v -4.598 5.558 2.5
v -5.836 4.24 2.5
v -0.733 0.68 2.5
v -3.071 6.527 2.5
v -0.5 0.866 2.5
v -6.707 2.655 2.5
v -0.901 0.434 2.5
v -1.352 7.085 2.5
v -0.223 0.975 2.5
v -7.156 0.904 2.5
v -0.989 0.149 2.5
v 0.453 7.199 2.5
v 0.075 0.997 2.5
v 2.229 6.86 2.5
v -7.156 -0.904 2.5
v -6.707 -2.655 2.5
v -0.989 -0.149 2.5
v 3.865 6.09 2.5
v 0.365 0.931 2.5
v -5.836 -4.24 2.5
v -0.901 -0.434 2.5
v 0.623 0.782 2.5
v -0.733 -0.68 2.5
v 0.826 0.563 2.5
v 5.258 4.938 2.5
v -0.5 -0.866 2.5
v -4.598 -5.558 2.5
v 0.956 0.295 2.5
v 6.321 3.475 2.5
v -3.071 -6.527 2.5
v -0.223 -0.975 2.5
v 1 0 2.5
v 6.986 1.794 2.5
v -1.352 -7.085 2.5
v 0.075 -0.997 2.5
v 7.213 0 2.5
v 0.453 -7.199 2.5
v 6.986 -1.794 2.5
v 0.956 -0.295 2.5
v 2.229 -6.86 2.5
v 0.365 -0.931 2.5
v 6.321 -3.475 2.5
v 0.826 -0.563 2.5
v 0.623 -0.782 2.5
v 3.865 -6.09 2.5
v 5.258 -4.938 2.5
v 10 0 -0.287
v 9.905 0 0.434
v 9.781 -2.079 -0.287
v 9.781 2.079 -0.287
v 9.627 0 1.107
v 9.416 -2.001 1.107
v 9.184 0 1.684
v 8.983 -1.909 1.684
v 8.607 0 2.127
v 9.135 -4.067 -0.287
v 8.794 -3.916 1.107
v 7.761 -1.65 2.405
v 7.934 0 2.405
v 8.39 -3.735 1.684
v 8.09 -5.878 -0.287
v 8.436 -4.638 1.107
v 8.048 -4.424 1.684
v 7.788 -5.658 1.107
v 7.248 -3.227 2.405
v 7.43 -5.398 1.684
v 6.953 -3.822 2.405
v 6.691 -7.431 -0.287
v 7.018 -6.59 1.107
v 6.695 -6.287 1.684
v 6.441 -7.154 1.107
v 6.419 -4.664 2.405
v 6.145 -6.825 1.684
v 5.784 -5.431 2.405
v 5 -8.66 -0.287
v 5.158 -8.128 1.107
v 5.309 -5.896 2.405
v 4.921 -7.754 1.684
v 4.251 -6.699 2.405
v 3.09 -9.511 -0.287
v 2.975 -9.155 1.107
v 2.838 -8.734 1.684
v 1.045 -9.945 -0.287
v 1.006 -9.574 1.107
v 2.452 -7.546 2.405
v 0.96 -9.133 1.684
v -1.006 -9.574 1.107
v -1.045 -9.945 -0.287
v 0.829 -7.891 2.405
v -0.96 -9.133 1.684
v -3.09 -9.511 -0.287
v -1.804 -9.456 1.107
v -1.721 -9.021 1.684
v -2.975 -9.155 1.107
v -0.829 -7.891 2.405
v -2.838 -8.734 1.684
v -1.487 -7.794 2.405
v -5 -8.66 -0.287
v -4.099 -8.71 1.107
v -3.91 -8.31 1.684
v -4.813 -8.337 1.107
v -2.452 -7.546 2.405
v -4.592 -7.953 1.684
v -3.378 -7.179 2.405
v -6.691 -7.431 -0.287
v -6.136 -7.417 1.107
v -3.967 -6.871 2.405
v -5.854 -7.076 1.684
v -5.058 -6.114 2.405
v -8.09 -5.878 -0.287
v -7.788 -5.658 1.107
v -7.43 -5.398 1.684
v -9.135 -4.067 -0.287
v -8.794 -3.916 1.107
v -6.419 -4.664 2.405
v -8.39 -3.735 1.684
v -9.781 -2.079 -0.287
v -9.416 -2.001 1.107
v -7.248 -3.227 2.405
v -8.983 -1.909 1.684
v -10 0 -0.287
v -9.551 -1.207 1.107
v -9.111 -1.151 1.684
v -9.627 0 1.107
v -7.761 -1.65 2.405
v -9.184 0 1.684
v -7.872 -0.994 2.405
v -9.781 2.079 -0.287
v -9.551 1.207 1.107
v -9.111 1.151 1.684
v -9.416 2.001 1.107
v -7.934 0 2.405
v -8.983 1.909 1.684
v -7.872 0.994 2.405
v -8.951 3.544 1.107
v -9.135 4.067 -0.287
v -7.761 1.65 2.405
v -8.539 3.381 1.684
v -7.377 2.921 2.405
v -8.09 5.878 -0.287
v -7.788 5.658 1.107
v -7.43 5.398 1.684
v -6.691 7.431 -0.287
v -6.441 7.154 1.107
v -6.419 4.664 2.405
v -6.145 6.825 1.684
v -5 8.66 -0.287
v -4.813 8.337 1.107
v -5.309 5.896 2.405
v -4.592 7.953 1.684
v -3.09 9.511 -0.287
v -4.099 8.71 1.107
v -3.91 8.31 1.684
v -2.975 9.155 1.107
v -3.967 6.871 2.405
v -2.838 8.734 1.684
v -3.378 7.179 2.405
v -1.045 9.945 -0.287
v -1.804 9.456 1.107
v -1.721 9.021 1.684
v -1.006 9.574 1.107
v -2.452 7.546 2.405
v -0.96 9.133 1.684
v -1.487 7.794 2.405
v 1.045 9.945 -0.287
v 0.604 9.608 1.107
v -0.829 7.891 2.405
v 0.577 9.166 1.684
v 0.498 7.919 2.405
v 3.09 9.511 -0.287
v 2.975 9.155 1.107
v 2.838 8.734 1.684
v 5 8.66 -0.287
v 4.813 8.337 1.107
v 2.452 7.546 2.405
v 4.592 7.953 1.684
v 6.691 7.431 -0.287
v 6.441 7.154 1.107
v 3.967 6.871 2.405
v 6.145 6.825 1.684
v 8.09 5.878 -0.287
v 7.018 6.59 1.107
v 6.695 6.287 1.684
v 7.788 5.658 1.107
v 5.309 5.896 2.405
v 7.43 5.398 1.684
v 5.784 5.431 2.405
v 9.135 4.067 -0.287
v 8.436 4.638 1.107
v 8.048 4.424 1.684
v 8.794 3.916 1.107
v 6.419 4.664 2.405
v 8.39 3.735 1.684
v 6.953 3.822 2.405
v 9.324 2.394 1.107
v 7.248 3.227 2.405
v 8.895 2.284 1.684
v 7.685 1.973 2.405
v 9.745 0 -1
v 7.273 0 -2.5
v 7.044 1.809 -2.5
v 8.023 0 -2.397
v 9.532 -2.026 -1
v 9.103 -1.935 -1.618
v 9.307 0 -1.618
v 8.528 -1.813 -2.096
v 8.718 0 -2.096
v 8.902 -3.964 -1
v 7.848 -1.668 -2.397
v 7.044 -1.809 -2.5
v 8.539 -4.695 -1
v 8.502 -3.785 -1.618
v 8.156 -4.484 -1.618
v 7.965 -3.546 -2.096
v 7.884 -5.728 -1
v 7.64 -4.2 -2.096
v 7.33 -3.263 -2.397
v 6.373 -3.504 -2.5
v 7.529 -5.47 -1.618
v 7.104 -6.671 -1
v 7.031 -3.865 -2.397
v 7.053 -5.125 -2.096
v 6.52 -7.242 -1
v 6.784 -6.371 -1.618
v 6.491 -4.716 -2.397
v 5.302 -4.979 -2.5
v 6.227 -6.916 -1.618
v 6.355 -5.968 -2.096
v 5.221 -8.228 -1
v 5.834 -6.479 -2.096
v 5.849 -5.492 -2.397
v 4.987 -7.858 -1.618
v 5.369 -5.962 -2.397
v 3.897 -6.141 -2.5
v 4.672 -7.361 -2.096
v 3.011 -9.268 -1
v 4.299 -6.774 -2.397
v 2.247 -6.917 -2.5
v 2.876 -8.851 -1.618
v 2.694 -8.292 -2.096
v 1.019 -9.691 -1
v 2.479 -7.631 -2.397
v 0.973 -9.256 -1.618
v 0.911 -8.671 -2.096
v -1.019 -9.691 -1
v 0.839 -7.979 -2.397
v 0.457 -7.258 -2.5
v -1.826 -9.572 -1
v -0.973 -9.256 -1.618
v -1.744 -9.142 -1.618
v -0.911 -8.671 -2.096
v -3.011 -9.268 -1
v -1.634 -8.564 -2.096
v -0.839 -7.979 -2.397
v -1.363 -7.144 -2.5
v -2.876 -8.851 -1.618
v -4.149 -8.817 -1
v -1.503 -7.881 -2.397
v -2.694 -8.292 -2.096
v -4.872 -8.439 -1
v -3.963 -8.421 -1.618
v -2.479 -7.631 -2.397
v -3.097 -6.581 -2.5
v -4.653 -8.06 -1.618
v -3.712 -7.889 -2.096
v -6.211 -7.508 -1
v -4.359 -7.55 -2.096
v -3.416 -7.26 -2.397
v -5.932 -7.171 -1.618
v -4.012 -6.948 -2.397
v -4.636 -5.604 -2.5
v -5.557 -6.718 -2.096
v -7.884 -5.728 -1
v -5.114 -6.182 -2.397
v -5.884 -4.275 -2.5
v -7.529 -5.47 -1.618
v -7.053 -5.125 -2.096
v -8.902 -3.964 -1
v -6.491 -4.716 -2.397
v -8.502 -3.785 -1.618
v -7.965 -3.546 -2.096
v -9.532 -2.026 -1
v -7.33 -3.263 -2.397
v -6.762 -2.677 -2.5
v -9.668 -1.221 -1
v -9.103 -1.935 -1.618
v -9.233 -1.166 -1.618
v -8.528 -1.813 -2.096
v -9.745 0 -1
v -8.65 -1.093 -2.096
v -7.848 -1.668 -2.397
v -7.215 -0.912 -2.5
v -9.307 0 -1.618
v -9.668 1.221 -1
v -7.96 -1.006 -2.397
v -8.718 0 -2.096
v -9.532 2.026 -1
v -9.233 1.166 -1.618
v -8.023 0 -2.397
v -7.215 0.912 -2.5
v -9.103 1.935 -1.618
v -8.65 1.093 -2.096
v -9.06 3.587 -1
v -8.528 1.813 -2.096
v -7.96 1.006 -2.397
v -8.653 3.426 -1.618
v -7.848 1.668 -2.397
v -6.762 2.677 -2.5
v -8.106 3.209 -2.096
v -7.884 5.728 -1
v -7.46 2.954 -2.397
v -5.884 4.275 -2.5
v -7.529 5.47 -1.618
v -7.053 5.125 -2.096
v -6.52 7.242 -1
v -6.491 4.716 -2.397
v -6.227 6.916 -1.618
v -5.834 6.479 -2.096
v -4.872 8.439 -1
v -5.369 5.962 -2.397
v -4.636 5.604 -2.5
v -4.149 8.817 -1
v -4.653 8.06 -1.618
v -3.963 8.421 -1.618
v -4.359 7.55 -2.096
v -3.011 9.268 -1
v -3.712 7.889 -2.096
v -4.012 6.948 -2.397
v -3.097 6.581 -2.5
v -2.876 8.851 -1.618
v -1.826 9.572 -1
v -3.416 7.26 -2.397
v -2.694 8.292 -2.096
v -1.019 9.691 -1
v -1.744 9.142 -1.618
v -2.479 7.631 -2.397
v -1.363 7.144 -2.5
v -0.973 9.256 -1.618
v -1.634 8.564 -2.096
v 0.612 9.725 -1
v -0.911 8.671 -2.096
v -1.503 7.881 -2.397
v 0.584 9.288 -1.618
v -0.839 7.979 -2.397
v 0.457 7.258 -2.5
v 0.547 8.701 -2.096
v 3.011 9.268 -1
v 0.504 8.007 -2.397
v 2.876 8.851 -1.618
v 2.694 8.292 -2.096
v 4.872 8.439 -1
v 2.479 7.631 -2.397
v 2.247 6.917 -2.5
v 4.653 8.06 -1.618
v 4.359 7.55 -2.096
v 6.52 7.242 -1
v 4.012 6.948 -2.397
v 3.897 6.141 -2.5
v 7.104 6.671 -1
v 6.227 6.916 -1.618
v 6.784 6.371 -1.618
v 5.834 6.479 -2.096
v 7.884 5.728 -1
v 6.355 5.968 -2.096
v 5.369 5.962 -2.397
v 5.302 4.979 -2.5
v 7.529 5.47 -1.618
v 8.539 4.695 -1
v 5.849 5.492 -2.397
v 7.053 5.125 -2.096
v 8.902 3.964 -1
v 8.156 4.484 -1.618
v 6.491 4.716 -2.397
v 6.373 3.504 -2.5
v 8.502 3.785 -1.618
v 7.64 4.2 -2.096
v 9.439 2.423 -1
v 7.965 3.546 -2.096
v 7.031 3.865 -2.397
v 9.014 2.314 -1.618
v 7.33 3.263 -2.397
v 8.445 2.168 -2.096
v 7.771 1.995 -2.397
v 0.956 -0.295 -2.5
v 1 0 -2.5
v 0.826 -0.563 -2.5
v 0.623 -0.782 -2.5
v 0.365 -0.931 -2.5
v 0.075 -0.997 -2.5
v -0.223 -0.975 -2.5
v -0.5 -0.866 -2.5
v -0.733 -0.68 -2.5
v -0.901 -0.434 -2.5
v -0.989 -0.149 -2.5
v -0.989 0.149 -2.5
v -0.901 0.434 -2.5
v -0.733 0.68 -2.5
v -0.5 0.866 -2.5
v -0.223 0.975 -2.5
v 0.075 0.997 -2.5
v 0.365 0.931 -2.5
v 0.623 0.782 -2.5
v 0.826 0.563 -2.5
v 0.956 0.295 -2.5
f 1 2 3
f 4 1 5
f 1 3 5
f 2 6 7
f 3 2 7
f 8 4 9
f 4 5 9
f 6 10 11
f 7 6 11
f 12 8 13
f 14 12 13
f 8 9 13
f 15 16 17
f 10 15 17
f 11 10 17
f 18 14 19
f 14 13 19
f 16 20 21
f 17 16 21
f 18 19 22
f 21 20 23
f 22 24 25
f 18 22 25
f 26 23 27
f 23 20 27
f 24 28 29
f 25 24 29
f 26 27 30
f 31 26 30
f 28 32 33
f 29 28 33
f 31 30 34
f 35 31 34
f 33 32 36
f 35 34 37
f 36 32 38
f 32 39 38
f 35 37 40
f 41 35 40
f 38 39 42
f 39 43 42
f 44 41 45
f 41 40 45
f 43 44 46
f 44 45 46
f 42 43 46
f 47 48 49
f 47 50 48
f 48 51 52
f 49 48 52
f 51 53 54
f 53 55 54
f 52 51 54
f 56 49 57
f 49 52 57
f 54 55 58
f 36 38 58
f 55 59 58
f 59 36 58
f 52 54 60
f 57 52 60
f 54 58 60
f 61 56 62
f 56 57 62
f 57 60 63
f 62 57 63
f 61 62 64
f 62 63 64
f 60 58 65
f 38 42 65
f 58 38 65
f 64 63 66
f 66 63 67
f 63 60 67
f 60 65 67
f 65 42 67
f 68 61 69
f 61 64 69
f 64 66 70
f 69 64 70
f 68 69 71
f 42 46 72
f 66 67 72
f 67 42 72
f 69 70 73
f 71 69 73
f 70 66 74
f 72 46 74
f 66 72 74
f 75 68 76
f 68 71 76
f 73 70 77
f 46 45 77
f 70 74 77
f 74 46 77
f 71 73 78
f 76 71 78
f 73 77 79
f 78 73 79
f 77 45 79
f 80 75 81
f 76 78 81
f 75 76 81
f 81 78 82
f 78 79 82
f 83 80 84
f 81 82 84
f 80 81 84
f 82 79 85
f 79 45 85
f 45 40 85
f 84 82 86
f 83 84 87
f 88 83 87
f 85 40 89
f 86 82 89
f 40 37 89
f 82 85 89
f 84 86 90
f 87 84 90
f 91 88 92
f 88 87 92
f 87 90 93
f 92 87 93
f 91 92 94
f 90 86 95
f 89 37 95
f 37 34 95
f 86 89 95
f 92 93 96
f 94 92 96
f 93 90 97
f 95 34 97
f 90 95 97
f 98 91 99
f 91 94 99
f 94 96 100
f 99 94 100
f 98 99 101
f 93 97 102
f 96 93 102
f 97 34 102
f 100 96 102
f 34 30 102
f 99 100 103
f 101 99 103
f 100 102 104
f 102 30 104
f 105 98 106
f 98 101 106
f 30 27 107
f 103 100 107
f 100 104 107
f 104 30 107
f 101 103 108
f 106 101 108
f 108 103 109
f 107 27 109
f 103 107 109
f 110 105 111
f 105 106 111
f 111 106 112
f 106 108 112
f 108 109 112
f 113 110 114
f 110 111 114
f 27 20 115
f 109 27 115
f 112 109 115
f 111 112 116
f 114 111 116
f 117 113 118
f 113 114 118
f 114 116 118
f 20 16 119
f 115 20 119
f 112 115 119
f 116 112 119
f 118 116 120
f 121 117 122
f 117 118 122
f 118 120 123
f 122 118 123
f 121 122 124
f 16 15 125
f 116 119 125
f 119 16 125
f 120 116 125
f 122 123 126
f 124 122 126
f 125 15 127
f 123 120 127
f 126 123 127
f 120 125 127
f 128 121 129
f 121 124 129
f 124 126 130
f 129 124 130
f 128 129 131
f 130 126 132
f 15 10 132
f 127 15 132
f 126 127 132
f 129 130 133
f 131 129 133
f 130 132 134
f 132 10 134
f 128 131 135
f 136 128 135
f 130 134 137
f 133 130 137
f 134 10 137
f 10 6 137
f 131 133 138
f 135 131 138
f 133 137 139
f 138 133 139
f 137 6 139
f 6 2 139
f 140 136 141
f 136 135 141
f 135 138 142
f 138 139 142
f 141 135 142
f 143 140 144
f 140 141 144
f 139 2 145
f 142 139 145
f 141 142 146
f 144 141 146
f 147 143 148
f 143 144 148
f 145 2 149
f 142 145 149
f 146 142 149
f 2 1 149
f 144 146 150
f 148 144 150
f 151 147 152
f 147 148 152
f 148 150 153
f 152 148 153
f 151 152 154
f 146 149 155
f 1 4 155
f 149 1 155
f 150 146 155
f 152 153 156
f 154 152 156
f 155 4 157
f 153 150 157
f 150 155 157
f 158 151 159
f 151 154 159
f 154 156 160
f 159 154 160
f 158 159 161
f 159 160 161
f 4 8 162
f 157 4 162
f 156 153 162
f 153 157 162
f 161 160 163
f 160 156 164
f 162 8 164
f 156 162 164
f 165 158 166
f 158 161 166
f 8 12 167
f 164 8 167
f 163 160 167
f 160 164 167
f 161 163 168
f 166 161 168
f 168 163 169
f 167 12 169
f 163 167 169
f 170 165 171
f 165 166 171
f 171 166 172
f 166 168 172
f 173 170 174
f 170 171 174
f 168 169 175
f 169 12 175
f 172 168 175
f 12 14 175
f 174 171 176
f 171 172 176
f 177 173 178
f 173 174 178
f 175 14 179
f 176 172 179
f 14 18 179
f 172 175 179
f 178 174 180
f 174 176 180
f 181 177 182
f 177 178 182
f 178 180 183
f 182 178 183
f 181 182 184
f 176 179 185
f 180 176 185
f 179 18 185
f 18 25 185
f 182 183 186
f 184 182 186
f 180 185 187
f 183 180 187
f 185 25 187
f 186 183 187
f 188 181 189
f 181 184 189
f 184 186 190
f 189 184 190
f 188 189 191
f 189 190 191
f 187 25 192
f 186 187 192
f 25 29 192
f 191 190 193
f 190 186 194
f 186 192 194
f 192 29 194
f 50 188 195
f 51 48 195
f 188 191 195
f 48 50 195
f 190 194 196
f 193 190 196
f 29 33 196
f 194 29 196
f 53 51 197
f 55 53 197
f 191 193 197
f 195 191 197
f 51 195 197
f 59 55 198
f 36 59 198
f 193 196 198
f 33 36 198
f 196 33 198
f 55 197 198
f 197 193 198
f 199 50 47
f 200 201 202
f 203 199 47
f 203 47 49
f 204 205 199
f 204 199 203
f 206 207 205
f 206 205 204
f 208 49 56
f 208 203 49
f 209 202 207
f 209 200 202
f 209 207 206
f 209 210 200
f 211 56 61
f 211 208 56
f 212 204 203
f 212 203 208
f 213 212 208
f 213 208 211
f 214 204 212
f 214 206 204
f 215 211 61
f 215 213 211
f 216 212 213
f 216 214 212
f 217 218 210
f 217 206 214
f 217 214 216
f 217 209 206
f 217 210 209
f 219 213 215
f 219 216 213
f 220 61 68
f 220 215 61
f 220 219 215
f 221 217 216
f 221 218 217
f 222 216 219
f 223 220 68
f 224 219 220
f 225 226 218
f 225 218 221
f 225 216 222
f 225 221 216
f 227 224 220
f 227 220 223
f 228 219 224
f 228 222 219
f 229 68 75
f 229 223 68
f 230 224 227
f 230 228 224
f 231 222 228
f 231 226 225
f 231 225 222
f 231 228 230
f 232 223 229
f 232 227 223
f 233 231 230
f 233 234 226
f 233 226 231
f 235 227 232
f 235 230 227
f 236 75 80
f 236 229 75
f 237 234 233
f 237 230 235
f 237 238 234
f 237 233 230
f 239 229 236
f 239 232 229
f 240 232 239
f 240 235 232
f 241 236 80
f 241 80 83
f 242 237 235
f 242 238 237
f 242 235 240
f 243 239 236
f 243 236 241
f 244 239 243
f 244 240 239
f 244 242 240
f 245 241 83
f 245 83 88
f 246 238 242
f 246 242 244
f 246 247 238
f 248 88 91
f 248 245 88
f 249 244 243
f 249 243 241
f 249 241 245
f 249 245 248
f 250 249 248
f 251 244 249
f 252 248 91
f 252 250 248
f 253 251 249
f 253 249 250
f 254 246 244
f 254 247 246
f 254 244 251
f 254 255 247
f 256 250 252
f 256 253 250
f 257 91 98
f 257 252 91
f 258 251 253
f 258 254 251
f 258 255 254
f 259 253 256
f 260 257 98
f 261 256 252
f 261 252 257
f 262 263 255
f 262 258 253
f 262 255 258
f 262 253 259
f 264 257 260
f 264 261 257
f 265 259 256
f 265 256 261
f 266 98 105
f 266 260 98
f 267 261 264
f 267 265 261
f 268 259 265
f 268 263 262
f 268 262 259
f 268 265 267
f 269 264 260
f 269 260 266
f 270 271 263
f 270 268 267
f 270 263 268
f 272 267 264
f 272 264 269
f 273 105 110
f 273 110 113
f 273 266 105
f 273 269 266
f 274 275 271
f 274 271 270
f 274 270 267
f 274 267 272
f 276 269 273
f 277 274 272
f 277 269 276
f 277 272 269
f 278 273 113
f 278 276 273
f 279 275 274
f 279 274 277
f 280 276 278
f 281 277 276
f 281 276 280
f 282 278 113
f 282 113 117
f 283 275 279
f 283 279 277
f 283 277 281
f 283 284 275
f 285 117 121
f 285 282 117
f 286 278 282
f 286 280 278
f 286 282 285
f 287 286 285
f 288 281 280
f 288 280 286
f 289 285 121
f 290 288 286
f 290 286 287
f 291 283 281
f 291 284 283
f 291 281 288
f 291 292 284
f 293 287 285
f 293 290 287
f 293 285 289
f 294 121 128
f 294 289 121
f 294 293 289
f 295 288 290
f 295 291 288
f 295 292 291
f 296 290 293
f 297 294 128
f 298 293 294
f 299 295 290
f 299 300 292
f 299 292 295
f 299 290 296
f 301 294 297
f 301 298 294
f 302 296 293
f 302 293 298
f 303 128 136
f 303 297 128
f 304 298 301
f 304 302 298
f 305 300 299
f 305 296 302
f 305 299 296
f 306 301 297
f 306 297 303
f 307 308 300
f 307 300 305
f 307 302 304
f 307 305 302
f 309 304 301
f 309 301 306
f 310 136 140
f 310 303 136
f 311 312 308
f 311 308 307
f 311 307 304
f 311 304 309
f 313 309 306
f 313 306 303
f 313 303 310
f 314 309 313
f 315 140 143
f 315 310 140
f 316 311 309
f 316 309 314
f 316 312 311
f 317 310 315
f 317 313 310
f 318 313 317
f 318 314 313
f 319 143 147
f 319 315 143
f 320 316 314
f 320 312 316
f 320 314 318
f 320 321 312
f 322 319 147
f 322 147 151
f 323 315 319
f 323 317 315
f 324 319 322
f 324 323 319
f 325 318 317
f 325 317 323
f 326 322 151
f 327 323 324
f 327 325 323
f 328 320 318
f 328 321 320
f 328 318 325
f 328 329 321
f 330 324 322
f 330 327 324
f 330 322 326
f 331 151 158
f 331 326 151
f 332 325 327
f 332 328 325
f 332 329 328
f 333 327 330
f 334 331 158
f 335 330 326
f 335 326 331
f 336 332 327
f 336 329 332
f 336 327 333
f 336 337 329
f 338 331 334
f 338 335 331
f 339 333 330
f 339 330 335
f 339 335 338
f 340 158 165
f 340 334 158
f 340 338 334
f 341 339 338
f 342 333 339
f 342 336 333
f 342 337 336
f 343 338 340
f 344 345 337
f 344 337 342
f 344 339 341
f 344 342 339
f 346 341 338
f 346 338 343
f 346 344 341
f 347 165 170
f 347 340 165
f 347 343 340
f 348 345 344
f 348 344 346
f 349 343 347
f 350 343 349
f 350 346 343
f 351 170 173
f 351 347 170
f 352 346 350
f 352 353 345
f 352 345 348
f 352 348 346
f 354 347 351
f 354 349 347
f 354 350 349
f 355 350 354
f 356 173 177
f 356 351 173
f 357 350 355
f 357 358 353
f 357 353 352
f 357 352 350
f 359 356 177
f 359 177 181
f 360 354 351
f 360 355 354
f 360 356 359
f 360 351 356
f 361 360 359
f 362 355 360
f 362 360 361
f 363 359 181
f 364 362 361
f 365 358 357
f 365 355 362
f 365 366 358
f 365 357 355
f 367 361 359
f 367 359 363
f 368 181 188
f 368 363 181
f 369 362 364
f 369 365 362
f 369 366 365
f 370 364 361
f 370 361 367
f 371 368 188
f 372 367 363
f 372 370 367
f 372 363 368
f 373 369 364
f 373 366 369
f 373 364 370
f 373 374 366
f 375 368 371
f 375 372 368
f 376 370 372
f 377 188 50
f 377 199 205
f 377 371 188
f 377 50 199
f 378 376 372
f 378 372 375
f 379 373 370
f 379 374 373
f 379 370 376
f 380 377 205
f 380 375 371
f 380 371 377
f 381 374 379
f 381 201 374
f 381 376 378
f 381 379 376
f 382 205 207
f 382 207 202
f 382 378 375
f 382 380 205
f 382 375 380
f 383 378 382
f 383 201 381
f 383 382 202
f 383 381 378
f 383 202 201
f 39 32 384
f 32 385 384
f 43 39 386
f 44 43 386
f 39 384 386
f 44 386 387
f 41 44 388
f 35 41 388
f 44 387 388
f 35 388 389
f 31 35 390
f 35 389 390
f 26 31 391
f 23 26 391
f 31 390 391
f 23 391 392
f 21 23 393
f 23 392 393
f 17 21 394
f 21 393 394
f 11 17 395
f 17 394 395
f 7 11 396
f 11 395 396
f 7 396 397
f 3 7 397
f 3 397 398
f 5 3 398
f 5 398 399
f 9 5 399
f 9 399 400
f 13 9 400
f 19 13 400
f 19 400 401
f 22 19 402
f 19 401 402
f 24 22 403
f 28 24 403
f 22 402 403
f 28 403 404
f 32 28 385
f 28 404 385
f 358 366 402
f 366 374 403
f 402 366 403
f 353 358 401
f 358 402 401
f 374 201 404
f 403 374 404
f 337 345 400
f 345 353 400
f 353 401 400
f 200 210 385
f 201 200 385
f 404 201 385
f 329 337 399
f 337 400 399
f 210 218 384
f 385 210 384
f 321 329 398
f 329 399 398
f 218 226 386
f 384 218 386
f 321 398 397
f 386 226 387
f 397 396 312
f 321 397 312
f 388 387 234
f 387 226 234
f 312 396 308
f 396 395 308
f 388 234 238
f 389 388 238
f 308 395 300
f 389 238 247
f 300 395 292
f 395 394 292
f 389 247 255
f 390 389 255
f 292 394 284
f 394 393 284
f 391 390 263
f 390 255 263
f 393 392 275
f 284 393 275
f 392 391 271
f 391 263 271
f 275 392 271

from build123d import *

# Parameters (mm, degrees)
F2_R = 2.7869198521


# Not quite as in the source:
# - a fillet or chamfer that OpenCascade refuses, or shapes differently, is made with other operations: its cross-section is extruded or revolved along the edge and cut away or added


with BuildPart() as f1:
    # F0 (on Front) → F1 (revolve)
    with BuildSketch(Plane.XZ):
        Polygon((8.5, -2.5), (10, -2.5), (10, 2.5), (8.5, 2.5), (1, 2.5), (1, -2.5), align=None)
    revolve(axis=Axis((0, 0, 0), (0, 0, -1)))

    # F2
    f2_edges = [f1.edges().sort_by_distance(p)[0] for p in [
        (-10, 0, 2.5),
    ]]
    fillet(f2_edges, radius=F2_R)

    # F3: fillet of radius 2.787 on 1 edges, made by hand

    # F3_s1 → F3_t2 (revolve, cut)
    with BuildSketch(Plane.XZ):
        with BuildLine():
            ThreePointArc((10, -0.2869198521), (9.0288444344, -1.8771261086), (7.2727330524, -2.5))
            Line((7.2727330524, -2.5), (10, -2.5))
            Line((10, -2.5), (10, -0.2869198521))
        make_face()
    revolve(axis=Axis((0, 0, -2.5), (0, 0, -1)), mode=Mode.SUBTRACT)


solid = f1.part
